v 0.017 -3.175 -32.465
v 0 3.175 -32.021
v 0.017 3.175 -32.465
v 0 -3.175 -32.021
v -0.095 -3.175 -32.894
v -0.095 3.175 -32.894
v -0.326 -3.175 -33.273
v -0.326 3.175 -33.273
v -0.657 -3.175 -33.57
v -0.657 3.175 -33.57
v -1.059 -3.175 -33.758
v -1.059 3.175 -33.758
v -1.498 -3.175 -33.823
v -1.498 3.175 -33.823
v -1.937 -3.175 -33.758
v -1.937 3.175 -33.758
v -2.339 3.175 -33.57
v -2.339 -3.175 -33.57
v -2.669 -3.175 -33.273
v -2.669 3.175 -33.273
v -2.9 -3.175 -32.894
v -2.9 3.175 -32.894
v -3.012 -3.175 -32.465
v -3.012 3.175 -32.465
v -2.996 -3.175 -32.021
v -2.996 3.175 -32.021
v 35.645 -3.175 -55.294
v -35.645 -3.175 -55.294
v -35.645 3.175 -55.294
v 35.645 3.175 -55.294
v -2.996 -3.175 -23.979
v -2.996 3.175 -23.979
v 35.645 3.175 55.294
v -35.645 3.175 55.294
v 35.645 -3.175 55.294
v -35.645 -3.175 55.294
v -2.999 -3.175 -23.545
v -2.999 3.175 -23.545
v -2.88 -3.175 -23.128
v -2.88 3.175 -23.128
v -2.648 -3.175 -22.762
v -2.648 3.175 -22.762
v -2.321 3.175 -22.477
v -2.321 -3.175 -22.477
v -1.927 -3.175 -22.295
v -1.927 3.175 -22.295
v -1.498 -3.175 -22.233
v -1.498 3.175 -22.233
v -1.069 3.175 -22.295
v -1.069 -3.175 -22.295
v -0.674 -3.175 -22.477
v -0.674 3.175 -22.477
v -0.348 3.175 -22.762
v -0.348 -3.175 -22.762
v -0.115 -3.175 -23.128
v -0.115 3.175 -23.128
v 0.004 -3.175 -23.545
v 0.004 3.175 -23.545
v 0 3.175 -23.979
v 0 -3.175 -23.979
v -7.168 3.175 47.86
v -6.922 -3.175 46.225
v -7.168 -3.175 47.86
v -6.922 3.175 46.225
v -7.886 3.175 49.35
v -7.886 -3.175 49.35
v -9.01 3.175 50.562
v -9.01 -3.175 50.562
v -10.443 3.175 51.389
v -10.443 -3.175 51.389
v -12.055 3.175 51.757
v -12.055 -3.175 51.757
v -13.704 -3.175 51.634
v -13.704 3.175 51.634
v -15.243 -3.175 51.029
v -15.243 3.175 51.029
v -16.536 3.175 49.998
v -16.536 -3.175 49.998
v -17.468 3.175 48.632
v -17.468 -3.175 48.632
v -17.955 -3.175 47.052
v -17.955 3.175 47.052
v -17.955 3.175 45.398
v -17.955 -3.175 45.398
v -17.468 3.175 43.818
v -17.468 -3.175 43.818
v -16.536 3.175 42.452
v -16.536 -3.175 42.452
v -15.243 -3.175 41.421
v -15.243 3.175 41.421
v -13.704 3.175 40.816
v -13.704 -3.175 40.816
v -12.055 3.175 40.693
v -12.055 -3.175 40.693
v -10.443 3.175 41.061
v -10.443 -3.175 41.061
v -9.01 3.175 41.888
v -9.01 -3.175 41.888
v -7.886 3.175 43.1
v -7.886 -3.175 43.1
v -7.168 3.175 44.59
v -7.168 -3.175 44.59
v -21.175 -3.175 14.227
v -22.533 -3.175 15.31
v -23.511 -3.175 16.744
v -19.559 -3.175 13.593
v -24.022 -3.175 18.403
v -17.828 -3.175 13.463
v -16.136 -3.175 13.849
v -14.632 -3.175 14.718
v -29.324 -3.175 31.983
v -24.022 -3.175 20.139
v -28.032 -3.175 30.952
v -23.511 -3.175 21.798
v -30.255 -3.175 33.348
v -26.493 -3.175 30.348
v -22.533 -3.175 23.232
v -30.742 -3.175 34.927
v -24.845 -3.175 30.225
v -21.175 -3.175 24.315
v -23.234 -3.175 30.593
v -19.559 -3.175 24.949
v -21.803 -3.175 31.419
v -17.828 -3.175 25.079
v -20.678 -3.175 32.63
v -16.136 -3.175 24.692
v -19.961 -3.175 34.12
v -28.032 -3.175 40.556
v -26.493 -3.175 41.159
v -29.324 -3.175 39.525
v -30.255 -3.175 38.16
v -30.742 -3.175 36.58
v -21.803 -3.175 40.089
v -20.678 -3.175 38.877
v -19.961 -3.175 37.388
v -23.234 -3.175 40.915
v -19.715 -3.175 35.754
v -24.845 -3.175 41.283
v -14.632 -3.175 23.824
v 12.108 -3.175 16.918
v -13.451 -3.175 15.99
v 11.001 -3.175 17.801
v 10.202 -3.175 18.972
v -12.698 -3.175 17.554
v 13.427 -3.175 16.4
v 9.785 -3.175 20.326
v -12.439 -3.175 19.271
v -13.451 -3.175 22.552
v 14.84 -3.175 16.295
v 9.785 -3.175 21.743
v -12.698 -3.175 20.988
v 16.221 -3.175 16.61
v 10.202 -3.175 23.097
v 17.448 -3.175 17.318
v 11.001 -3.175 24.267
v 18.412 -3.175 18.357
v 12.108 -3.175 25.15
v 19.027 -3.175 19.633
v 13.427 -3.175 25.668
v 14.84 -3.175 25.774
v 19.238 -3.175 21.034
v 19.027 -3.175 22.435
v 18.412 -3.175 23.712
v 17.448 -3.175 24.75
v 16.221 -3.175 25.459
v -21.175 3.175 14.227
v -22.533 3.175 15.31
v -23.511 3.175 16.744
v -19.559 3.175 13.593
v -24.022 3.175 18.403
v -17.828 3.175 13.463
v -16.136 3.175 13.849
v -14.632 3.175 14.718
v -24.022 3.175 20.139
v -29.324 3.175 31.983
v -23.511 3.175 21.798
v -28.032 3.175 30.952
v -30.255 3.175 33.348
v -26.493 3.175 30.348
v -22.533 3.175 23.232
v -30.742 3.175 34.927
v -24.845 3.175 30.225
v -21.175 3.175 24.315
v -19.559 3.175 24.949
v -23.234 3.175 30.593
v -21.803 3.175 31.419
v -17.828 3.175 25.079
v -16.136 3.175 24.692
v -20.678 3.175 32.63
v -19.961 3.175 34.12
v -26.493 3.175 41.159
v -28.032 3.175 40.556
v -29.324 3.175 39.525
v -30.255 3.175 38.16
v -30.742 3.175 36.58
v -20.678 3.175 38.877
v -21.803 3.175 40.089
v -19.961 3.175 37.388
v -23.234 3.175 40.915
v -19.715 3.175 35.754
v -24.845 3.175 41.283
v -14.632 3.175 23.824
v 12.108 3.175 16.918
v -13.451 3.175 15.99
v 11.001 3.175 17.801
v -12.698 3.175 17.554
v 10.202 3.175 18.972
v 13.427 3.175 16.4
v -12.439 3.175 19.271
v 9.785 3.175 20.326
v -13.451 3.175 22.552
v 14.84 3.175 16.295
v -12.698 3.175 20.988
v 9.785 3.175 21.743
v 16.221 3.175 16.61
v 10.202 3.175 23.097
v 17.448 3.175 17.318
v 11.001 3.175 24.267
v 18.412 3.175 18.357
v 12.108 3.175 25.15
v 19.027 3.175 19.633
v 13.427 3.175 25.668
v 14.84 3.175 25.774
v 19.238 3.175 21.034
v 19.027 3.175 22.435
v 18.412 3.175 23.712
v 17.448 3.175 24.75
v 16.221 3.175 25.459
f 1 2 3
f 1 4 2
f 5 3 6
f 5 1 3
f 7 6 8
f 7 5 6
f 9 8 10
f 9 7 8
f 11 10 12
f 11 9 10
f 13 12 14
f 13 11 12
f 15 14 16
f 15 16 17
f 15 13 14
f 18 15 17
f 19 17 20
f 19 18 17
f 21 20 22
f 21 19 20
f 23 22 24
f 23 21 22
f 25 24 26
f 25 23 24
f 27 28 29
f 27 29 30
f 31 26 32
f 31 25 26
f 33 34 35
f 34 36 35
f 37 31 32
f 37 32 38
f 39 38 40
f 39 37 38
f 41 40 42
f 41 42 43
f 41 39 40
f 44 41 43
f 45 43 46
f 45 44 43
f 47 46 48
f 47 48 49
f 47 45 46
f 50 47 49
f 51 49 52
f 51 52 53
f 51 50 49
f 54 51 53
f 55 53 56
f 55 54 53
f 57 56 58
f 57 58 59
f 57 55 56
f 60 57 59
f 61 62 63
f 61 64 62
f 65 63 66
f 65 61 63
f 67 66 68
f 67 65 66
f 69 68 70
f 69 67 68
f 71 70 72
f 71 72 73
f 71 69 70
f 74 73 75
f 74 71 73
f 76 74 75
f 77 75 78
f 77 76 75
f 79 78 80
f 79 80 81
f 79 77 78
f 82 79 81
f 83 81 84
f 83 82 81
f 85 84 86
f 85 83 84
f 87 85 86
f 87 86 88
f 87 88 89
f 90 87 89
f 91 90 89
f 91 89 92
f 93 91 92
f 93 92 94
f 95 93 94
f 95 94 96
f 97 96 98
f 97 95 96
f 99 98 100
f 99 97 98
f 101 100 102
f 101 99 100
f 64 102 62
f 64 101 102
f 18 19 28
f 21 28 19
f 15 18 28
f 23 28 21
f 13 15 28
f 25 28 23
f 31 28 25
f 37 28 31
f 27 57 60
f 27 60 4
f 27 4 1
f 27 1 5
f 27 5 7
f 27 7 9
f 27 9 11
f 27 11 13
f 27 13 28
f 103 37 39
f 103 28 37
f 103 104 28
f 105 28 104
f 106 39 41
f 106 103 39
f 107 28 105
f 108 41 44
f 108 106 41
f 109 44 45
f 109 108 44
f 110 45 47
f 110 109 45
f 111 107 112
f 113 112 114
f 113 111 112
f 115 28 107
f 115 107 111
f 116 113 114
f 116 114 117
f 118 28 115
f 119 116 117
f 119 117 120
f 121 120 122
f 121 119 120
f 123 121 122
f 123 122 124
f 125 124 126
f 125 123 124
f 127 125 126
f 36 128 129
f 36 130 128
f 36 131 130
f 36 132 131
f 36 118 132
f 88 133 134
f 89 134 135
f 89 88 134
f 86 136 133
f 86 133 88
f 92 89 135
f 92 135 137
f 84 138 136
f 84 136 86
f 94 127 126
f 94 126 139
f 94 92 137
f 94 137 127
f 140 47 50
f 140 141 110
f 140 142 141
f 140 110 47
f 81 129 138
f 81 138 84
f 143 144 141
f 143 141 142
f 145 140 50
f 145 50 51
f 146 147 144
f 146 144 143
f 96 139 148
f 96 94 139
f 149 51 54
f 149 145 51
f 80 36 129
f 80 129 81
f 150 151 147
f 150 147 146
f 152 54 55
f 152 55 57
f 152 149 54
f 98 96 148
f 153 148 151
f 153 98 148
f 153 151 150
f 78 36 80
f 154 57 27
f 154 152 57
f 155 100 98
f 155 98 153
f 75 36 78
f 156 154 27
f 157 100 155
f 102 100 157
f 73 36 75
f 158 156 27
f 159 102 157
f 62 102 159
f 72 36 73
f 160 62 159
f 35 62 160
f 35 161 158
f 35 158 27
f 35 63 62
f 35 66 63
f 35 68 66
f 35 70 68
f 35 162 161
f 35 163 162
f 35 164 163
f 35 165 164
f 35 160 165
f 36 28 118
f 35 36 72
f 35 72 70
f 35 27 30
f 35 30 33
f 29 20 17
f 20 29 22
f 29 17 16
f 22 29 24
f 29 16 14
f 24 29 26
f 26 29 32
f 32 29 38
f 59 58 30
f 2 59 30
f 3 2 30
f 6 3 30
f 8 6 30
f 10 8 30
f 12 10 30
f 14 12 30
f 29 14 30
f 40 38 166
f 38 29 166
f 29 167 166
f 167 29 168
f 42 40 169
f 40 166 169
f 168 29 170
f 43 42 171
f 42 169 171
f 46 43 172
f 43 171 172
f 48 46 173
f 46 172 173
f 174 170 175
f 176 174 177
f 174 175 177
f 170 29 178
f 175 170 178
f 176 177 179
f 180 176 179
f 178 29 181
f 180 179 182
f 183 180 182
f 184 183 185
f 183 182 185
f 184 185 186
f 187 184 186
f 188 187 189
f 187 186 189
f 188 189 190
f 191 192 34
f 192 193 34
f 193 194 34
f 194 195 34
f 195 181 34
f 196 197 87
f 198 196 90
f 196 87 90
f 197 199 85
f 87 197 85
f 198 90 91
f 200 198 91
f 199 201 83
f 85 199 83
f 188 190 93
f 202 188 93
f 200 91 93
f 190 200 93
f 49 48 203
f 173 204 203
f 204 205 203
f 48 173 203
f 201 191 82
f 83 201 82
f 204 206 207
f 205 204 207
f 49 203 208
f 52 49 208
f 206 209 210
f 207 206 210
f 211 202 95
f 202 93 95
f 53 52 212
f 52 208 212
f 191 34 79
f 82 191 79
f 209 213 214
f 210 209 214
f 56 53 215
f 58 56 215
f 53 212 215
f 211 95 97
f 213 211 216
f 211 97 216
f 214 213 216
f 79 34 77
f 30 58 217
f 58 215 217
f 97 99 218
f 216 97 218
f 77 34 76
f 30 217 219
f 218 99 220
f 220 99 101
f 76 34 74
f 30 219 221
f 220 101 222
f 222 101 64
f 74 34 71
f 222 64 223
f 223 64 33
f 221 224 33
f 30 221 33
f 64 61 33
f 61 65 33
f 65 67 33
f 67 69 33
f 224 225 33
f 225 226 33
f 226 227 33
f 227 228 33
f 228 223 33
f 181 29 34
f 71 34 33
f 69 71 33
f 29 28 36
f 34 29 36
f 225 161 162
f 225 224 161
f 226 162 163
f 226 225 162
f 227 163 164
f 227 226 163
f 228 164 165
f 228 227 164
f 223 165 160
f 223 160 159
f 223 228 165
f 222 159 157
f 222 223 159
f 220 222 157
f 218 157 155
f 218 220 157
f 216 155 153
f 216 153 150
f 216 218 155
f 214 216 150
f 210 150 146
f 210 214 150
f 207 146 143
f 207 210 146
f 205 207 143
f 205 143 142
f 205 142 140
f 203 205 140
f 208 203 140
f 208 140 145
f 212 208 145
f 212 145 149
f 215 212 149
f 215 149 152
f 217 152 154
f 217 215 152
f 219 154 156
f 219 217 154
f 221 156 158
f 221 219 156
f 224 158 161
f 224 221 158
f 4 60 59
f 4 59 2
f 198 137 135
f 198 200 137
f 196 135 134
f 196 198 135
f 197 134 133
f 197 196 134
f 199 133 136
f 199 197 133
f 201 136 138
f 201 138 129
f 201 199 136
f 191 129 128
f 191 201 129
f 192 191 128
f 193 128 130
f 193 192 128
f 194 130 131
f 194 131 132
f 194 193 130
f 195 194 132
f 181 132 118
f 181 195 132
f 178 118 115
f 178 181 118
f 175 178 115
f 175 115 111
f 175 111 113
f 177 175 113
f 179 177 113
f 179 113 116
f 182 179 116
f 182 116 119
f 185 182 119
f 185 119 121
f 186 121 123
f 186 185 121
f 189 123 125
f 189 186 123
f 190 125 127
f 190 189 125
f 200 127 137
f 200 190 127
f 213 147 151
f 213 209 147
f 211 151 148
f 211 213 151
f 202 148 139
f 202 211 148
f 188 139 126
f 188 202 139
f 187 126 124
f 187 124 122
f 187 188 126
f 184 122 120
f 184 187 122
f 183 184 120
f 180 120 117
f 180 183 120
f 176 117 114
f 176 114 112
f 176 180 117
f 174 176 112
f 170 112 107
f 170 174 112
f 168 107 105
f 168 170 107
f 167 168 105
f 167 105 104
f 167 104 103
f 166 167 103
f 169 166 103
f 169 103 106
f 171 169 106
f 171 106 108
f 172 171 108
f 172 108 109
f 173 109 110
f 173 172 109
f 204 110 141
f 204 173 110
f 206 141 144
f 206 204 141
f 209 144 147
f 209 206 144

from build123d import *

# Parameters (mm, degrees)
F0_W     = 71.2898522615
F0_H     = 110.58742553
F0_R     = 5.8240303567
F0_R_2   = 5.544554678
F0_R_3   = 5.5476903885
F0_R_4   = 4.7529819841
F1_DEPTH = 3.175
F2_DEPTH = 3.175


with BuildPart() as f1:
    # F0 (on Front) → F1 (new body, symmetric)
    with BuildSketch(Plane.XZ):
        Rectangle(F0_W, F0_H)
        with BuildLine():
            ThreePointArc((-2.9955138452, -23.9786170423), (-1.4977569226, -22.2334064032), (0, -23.9786170423))
            Line((0, -23.9786170423), (0, -32.0213139057))
            ThreePointArc((0, -32.0213139057), (-1.4977569226, -33.8227026245), (-2.9955138452, -32.0213139057))
            Line((-2.9955138452, -32.0213139057), (-2.9955138452, -23.9786170423))
        make_face(mode=Mode.SUBTRACT)
        with Locations((-18.2633008808, 19.2709285766)):
            Circle(F0_R, mode=Mode.SUBTRACT)
        with Locations((-25.2595208585, 35.7538498938)):
            Circle(F0_R_2, mode=Mode.SUBTRACT)
        with Locations((-12.4694257975, 46.225041151)):
            Circle(F0_R_3, mode=Mode.SUBTRACT)
        with Locations((14.4846877083, 21.0342817008)):
            Circle(F0_R_4, mode=Mode.SUBTRACT)
    extrude(amount=F1_DEPTH, both=True)

    # F0 (on Front) → F2 (join, symmetric)
    with BuildSketch(Plane.XZ):
        Rectangle(F0_W, F0_H)
        with BuildLine():
            ThreePointArc((-2.9955138452, -23.9786170423), (-1.4977569226, -22.2334064032), (0, -23.9786170423))
            Line((0, -23.9786170423), (0, -32.0213139057))
            ThreePointArc((0, -32.0213139057), (-1.4977569226, -33.8227026245), (-2.9955138452, -32.0213139057))
            Line((-2.9955138452, -32.0213139057), (-2.9955138452, -23.9786170423))
        make_face(mode=Mode.SUBTRACT)
        with Locations((-18.2633008808, 19.2709285766)):
            Circle(F0_R, mode=Mode.SUBTRACT)
        with Locations((-25.2595208585, 35.7538498938)):
            Circle(F0_R_2, mode=Mode.SUBTRACT)
        with Locations((-12.4694257975, 46.225041151)):
            Circle(F0_R_3, mode=Mode.SUBTRACT)
        with Locations((14.4846877083, 21.0342817008)):
            Circle(F0_R_4, mode=Mode.SUBTRACT)
    extrude(amount=F2_DEPTH, both=True)


solid = f1.part
